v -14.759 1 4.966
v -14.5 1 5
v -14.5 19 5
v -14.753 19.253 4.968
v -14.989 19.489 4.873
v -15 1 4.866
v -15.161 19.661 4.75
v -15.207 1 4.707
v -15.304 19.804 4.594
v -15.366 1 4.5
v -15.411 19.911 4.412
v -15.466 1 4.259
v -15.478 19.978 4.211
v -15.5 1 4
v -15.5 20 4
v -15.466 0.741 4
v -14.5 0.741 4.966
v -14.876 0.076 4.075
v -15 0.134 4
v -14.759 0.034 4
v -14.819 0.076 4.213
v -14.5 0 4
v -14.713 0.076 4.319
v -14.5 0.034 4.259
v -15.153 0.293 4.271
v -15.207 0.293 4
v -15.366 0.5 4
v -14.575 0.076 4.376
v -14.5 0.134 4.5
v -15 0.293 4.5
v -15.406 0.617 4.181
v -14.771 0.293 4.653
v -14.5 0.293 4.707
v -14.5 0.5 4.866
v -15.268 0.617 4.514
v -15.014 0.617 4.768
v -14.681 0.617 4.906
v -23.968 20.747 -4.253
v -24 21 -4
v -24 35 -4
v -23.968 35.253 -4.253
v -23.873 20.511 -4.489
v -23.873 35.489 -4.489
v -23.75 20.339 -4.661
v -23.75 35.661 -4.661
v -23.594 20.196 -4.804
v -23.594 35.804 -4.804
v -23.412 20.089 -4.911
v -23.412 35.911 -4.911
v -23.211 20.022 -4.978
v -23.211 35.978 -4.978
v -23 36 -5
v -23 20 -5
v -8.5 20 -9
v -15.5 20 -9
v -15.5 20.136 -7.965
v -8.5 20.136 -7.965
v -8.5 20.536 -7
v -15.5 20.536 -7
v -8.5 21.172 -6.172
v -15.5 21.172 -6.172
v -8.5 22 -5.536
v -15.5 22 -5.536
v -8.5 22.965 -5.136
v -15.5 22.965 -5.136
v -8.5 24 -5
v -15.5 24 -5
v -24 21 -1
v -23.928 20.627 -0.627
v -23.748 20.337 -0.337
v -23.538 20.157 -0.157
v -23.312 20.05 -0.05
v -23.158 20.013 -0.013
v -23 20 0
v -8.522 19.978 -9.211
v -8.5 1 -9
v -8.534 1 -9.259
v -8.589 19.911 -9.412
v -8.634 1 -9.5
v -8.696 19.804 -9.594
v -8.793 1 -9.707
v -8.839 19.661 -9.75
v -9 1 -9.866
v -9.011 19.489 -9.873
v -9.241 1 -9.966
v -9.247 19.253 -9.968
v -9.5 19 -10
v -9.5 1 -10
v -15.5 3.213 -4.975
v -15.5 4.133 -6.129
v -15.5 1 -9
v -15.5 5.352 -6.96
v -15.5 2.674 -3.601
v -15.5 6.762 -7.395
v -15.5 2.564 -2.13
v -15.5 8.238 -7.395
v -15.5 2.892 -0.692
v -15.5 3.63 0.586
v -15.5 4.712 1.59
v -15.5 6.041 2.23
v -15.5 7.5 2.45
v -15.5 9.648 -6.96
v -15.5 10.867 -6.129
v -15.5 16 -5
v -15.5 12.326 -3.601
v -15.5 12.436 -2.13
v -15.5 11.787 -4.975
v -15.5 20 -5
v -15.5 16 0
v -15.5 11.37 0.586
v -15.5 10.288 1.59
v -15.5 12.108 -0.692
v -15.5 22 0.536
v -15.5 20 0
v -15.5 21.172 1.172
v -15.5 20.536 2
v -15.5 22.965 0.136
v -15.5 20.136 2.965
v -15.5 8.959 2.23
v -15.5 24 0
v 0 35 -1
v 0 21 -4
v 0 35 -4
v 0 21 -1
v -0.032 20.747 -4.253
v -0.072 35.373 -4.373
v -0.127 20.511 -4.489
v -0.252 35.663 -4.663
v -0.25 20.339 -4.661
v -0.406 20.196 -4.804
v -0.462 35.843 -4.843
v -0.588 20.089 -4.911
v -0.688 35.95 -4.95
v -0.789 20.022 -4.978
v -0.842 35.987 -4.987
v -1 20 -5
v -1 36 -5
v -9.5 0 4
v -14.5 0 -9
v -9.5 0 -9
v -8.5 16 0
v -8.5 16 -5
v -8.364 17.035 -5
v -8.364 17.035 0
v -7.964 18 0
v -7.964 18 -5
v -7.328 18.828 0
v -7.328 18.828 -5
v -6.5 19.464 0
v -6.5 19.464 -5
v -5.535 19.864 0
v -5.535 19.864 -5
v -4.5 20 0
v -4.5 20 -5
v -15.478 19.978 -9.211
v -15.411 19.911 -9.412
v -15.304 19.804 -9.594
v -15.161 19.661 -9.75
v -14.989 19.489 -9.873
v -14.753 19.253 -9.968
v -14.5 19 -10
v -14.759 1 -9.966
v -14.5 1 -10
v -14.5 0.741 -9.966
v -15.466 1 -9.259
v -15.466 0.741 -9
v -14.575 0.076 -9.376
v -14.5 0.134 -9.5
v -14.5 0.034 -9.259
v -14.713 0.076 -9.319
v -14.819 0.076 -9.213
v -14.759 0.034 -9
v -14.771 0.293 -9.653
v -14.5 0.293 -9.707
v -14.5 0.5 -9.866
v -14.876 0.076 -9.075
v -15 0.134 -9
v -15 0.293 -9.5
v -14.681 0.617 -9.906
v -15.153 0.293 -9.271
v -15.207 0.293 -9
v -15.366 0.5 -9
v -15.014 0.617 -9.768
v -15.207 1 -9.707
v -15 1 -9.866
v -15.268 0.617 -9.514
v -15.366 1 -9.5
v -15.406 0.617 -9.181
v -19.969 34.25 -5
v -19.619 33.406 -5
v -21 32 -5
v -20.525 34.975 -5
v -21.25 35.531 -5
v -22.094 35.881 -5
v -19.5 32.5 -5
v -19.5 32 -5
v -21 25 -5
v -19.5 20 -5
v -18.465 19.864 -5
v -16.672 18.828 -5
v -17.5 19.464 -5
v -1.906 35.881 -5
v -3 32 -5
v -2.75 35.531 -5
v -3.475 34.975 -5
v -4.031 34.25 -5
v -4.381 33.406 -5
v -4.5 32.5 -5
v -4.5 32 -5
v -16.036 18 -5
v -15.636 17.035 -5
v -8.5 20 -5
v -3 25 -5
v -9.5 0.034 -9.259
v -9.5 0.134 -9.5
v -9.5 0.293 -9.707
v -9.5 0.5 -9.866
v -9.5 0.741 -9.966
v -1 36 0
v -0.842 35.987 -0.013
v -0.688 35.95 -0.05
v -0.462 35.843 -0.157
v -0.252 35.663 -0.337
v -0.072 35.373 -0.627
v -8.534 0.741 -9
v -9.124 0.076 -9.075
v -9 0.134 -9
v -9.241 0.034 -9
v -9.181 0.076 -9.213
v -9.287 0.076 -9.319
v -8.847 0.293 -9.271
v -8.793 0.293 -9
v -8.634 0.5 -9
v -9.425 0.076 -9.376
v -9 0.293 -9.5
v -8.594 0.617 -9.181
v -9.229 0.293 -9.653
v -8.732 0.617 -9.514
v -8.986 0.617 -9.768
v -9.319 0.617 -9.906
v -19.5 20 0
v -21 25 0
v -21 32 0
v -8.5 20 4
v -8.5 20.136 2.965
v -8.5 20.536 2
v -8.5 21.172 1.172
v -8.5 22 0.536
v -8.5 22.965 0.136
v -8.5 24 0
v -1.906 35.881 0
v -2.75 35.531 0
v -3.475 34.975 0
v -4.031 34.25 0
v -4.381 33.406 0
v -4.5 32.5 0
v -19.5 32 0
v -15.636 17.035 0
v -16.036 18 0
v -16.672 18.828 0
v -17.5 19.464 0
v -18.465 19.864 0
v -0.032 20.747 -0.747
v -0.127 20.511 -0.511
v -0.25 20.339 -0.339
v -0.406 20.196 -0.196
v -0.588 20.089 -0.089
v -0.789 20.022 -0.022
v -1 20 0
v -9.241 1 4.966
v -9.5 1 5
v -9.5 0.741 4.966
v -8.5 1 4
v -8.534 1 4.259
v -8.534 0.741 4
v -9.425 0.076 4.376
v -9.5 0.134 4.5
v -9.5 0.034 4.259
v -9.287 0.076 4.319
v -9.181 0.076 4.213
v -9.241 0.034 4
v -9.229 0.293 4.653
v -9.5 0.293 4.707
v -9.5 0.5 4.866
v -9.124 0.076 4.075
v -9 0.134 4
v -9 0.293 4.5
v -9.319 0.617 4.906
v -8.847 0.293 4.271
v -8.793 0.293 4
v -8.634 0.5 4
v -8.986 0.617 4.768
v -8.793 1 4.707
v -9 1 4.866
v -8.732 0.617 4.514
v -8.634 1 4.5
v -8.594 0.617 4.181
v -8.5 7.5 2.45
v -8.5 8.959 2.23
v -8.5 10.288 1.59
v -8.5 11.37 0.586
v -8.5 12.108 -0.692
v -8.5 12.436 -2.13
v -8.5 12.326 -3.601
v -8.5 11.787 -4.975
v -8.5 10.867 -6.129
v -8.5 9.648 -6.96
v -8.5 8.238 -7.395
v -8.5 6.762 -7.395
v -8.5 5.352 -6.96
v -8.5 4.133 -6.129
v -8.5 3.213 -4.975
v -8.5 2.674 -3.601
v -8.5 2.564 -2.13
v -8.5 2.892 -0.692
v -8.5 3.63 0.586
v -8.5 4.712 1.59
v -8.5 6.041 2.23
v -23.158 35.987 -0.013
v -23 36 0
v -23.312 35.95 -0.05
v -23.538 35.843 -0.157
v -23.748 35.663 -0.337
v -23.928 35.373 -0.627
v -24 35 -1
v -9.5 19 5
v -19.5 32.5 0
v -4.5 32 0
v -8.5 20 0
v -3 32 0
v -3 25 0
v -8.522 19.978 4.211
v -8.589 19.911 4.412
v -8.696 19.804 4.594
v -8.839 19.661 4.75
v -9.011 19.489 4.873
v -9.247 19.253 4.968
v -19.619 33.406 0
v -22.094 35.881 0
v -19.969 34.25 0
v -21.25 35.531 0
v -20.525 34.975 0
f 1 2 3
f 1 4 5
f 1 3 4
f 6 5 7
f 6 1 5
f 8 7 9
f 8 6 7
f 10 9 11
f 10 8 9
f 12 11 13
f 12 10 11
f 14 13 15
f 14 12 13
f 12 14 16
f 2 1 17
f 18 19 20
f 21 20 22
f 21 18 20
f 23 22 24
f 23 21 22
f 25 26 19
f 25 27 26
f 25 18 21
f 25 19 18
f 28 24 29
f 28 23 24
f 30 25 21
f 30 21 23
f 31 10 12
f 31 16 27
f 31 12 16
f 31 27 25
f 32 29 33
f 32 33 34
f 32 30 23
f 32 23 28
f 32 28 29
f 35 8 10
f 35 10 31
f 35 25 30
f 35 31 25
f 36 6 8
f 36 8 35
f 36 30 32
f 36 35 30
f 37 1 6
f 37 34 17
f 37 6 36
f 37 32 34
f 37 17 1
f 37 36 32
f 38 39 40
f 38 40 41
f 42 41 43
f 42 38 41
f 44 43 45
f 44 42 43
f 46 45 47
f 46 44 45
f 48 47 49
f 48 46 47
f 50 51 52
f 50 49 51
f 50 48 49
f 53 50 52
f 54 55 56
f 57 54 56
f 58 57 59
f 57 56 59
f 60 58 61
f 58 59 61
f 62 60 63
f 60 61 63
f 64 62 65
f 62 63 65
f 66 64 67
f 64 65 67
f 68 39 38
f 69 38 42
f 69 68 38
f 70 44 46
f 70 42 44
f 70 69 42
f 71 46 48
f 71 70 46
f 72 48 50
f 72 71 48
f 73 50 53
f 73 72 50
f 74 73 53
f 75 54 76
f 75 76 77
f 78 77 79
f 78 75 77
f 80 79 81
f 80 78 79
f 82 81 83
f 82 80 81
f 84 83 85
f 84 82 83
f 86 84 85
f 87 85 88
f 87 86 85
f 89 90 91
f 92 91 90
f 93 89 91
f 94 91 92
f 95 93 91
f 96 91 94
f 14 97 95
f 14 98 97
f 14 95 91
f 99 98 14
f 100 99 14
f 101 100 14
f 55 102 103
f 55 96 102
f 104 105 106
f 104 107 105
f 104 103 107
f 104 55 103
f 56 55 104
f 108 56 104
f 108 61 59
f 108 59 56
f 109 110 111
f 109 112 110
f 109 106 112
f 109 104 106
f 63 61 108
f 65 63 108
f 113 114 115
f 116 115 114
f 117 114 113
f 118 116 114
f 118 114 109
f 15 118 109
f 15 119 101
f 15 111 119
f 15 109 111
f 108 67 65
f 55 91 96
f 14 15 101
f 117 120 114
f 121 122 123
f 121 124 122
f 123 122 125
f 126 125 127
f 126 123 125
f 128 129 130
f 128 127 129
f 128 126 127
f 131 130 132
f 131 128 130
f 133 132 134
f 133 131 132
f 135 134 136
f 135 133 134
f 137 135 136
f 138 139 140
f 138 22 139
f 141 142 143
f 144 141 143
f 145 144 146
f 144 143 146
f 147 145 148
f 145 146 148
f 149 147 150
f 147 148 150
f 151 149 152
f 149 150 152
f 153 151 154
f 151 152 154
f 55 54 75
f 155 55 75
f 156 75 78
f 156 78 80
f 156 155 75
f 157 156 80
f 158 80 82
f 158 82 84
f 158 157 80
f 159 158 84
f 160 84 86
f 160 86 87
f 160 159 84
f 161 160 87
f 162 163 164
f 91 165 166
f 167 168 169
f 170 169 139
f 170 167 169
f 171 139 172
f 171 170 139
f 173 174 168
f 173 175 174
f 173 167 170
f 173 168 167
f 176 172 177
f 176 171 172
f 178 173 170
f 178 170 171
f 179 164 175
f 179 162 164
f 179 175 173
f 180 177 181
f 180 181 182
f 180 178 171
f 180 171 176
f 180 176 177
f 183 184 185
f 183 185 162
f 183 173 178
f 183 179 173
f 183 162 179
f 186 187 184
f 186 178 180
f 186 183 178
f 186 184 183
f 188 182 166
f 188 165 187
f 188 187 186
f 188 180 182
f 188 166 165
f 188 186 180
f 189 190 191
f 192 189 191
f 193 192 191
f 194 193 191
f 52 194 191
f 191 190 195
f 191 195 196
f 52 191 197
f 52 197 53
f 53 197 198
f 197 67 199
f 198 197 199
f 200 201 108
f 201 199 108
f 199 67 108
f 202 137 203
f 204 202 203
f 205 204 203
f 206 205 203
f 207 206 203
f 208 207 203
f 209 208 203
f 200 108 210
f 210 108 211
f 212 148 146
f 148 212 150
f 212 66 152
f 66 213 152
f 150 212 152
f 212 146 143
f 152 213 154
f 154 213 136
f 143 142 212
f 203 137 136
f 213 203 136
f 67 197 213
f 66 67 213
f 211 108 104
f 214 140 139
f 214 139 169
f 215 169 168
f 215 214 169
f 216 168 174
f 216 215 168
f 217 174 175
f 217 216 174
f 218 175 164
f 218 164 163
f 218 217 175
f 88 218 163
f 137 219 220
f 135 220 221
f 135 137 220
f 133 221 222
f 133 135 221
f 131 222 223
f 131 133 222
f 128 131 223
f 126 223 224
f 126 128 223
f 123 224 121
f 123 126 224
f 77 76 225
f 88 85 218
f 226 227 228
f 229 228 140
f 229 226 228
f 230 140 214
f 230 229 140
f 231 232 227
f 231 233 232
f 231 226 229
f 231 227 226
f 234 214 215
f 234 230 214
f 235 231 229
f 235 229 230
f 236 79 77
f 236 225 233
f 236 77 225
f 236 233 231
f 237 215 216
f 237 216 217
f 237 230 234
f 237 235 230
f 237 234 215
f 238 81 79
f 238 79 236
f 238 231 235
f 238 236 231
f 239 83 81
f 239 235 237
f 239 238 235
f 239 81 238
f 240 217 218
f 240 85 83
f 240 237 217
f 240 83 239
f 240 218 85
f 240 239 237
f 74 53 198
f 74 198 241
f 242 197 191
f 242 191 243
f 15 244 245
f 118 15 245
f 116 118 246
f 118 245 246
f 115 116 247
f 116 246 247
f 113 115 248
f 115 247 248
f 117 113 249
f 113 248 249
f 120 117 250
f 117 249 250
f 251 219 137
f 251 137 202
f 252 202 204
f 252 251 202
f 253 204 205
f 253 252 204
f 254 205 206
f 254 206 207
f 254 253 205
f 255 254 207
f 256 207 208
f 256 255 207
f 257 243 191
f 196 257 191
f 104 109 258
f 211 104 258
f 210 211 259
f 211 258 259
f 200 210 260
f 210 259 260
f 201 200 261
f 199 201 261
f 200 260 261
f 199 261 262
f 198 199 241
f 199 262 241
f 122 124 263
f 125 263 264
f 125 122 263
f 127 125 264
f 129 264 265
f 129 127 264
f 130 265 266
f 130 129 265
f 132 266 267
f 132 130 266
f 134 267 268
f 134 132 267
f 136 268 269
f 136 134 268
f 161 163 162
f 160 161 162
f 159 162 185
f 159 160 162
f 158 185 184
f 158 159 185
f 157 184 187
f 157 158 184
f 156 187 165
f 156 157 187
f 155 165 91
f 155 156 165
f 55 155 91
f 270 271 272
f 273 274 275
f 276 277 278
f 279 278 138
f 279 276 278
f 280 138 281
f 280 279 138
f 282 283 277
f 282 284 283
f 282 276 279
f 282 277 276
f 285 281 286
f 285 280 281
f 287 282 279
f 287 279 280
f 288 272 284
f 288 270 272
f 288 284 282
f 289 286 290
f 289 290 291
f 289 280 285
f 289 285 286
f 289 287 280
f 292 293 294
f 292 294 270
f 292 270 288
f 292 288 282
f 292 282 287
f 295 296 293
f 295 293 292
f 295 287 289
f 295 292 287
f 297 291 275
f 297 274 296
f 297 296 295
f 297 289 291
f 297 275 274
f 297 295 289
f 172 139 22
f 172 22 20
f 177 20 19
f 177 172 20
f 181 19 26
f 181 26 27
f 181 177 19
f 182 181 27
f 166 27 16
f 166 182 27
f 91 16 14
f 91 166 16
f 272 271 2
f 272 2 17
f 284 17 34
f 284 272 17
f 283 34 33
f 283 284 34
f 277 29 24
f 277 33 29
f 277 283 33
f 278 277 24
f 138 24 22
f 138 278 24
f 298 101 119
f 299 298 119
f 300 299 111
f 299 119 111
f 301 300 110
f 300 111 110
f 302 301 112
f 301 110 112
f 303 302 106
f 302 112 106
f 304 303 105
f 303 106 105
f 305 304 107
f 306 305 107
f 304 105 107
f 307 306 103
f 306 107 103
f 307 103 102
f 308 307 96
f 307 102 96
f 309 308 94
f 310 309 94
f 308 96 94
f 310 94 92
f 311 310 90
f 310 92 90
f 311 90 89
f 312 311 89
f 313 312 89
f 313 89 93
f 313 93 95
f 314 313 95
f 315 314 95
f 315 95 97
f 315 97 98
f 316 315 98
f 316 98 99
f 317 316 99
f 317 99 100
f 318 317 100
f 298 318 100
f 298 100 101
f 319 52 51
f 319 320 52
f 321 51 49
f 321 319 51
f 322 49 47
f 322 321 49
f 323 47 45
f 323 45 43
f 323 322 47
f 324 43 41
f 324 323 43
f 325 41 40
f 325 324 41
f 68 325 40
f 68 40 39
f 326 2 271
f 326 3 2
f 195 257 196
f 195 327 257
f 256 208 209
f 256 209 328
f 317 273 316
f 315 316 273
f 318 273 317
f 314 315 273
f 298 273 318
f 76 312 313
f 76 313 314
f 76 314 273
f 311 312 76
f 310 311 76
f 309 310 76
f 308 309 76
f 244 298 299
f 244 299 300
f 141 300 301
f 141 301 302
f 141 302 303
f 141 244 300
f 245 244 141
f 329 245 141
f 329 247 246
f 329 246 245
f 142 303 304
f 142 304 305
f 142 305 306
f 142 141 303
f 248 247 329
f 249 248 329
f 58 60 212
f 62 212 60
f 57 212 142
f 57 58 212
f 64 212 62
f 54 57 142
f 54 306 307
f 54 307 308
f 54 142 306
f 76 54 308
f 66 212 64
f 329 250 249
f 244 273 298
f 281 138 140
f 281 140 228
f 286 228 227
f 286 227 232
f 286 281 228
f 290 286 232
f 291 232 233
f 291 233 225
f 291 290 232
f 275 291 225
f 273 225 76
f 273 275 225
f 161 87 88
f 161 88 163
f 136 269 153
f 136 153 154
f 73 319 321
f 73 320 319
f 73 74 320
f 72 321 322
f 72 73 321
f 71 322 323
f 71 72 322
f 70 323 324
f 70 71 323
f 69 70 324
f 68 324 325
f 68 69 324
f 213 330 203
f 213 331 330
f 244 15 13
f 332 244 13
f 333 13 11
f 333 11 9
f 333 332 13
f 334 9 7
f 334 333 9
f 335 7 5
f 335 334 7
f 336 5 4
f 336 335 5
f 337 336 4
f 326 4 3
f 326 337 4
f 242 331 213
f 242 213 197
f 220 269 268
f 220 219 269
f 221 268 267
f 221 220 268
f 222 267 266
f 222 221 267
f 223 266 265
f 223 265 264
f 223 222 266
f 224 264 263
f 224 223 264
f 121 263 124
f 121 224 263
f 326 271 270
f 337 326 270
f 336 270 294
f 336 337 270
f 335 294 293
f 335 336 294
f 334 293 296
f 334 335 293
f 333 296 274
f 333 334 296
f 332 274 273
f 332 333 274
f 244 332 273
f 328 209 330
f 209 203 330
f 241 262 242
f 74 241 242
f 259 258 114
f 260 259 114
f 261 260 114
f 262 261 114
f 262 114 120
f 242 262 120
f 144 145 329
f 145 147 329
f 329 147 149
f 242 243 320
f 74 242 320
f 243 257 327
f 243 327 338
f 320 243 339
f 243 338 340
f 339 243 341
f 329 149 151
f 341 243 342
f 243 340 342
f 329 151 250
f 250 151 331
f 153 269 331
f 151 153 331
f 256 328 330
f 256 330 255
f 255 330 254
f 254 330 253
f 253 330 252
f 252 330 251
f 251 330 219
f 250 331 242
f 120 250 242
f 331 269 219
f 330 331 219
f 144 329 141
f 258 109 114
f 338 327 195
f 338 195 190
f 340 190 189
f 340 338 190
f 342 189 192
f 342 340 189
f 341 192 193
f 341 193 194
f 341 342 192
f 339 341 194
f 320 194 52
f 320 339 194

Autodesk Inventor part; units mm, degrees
ref_plane "YZ Plane" through (0, 0, 0) normal (1, 0, 0) x (0, 1, 0)
ref_plane "XZ Plane" through (0, 0, 0) normal (0, 1, 0) x (-1, 0, 0)
ref_plane "XY Plane" through (0, 0, 0) normal (0, 0, 1) x (1, 0, 0)
sketch "스케치1" plane through (0, 0, 0) normal (0, 1, 0) x (-1, 0, 0)
  point P0 (0, 0)
sketch "스케치2" plane through (0, 0, 0) normal (0, 1, 0) x (-1, 0, 0)
  line L0 (0, 0) -> (24, 0)
  line L1 (24, 0) -> (24, -5)
  line L2 (24, -5) -> (0, -5)
  line L3 (0, -5) -> (0, 0)
  dimension "d0" = 24
  dimension "d1" = 5
extrude "돌출1" add sketch "스케치2" along normal blind 25
sketch "스케치3" plane through (0, 25, 0) normal (0, 1, 0) x (1, 0, 0)
  line L0 (-21, 0) -> (-3, 0)
  line L1 (-3, 0) -> (-3, 5)
  line L2 (-3, 5) -> (-21, 5)
  line L3 (-21, 5) -> (-21, 0)
  line L4 (0, 5) -> (-24, 5) projected
  line L5 (-24, 0) -> (0, 0) projected
  line L6 (-24, 5) -> (-24, 0) projected
  line L7 (0, 0) -> (0, 5) projected
  dimension "d4" = 3
  dimension "d5" = 3
extrude "돌출2" add sketch "스케치3" along normal blind 11 contours L5 L6 L4 L3 | L1 L4 L7 L5
sketch "스케치4" plane through (-21, 25, 0) normal (1, 0, 0) x (0, 0, -1)
  line L0 (0, 0) -> (0, 11) projected
  line L1 (5, 11) -> (0, 11)
  line L2 (0, 11) -> (0, 7)
  line L3 (0, 7) -> (5, 7)
  line L4 (5, 7) -> (5, 11)
  point P0 (0, -25)
  dimension "d8" = 4
extrude "돌출3" add sketch "스케치4" along normal blind 1.5
sketch "스케치5" plane through (-3, 25, -5) normal (-1, 0, 0) x (0, 0, 1)
  line L0 (0, 11) -> (5, 11) projected
  line L1 (5, 11) -> (0, 11)
  line L2 (0, 11) -> (0, 7)
  line L3 (0, 7) -> (5, 7)
  line L4 (5, 7) -> (5, 11)
  point P0 (5, -25)
  dimension "d11" = 4
extrude "돌출4" add sketch "스케치5" along normal blind 1.5
sketch "스케치6" plane through (-24, 0, 0) normal (0, 0, 1) x (1, 0, 0)
  line L0 (0, 0) -> (24, 0) projected
  line L1 (0, 0) -> (0, 36) projected
  line L2 (24, 0) -> (0, 0)
  line L3 (0, 0) -> (0, 20)
  line L4 (0, 20) -> (24, 20)
  line L5 (24, 20) -> (24, 0)
  line L6 (3, 25) -> (21, 25) projected
  dimension "d14" = 5
extrude "돌출5" add sketch "스케치6" along normal blind 5
sketch "스케치7" plane through (0, 0, -5) normal (0, 0, -1) x (-1, 0, 0)
  line L0 (0, 20) -> (24, 20)
  line L1 (24, 20) -> (24, 0)
  line L2 (24, 0) -> (0, 0)
  line L3 (0, 0) -> (0, 20)
  line L4 (0, 0) -> (0, 36) projected
  line L5 (24, 0) -> (24, 36) projected
  line L6 (24, 0) -> (0, 0) projected
  line L7 (3, 25) -> (21, 25) projected
  dimension "d17" = 5
extrude "돌출6" add sketch "스케치7" along normal blind 5
sketch "스케치8" plane through (0, 36, 0) normal (1, 0, 0) x (0, 0, -1)
  line L0 (10, -16) -> (10, -36) projected
  line L1 (-5, -36) -> (-5, -16) projected
  point P0 (0, -36)
  dimension "d20" = 15
sketch "스케치9" plane through (-24, 36, -5) normal (-1, 0, 0) x (0, 0, 1)
  circle A0 centre (2.5, -28.5) radius 4.95
  line L0 (-5, -36) -> (-5, -16) projected
  line L1 (10, -36) -> (-5, -36) projected
  line L2 (0, 0) -> (5, 0) projected
  point P0 (5, -36)
  dimension "d21" = 9.9
  dimension "d22" = 7.5
  dimension "d23" = 7.5
  dimension "d24" = 36
sketch "스케치10" plane through (-24, 36, -5) normal (-1, 0, 0) x (0, 0, 1)
  line L0 (0, -16) -> (-5, -16) projected
  line L1 (-5, -36) -> (10, -36) projected
  line L2 (-5, -16) -> (10, -16)
  line L3 (10, -16) -> (10, -36)
  line L4 (10, -36) -> (-5, -36)
  line L5 (-5, -36) -> (-5, -16)
  circle A0 centre (2.5, -28.5) radius 4.95 projected
  point P0 (5, -36)
extrude "돌출7" cut sketch "스케치10" against normal blind 50 contours A0
sketch "스케치11" plane through (-24, 36, -5) normal (-1, 0, 0) x (0, 0, 1)
  line L0 (0, -16) -> (-5, -16) projected
  line L1 (10, -16) -> (10, -36) projected
  line L2 (-5, -16) -> (10, -16)
  line L3 (10, -16) -> (10, -36)
  line L4 (10, -36) -> (-5, -36)
  line L5 (-5, -36) -> (-5, -16)
  point P0 (5, -36)
extrude "돌출8" cut sketch "스케치11" against normal blind 8.5
sketch "스케치12" plane through (0, 36, 0) normal (1, 0, 0) x (0, 0, -1)
  line L0 (0, -16) -> (-5, -16) projected
  line L1 (10, -36) -> (10, -16) projected
  line L2 (-5, -16) -> (10, -16)
  line L3 (10, -16) -> (10, -36)
  line L4 (10, -36) -> (-5, -36)
  line L5 (-5, -36) -> (-5, -16)
  point P0 (0, -36)
extrude "돌출9" cut sketch "스케치12" against normal blind 8.5
sketch "스케치13" plane through (-24, 0, 5) normal (0, 0, 1) x (1, 0, 0)
  point P0 (24, 0)
fillet "모깎기1" radius 4 4 edges at (-12, 20, 0) (-15.5, 20, -2.5) (-12, 20, -5) (-8.5, 20, -2.5)
fillet "모깎기2" radius 1 18 edges at (-8.5, 10, -10) (-8.5, 10, 5) (-8.5, 0, -2.5) (-15.5, 10, -10) (-12, 20, -10) (-12, 20, 5) (-15.5, 10, 5) (-15.5, 0, -2.5) (-12, 0, 5) (-12, 0, -10) (0, 20, -2.5) (0, 36, -2.5) (0, 28, -5) (0, 28, 0) (-24, 28, 0) (-24, 28, -5) (-24, 20, -2.5) (-24, 36, -2.5)
fillet "모깎기3" radius 3.5 2 edges at (-4.5, 36, -2.5) (-19.5, 36, -2.5)
sketch "스케치14" plane through (-3, 25, -5) normal (0, 0, -1) x (-1, 0, 0)
  line L0 (18, 7) -> (18, 0) projected
  line L1 (0, 0) -> (0, 7) projected
  point P0 (-3, -25)
  dimension "d34" = 18
sketch "스케치15" plane through (-21, 25, 0) normal (0, 0, 1) x (1, 0, 0)
  line L0 (0, 7) -> (1.5, 7) projected
  line L1 (0, 0) -> (18, 0) projected
  point P0 (21, -25)
  dimension "d35" = 7
sketch "스케치16" plane through (-24, 0, 5) normal (0, 0, 1) x (1, 0, 0)
  line L0 (14.5, 19) -> (14.5, 1) projected
  line L1 (9.5, 1) -> (9.5, 19) projected
  point P0 (24, 0)
  dimension "d36" = 5
sketch "스케치17" plane through (-8.5, 36, 0) normal (1, 0, 0) x (0, 0, -1)
  point P0 (0, -36)
properties part number "보조바퀴 축"
